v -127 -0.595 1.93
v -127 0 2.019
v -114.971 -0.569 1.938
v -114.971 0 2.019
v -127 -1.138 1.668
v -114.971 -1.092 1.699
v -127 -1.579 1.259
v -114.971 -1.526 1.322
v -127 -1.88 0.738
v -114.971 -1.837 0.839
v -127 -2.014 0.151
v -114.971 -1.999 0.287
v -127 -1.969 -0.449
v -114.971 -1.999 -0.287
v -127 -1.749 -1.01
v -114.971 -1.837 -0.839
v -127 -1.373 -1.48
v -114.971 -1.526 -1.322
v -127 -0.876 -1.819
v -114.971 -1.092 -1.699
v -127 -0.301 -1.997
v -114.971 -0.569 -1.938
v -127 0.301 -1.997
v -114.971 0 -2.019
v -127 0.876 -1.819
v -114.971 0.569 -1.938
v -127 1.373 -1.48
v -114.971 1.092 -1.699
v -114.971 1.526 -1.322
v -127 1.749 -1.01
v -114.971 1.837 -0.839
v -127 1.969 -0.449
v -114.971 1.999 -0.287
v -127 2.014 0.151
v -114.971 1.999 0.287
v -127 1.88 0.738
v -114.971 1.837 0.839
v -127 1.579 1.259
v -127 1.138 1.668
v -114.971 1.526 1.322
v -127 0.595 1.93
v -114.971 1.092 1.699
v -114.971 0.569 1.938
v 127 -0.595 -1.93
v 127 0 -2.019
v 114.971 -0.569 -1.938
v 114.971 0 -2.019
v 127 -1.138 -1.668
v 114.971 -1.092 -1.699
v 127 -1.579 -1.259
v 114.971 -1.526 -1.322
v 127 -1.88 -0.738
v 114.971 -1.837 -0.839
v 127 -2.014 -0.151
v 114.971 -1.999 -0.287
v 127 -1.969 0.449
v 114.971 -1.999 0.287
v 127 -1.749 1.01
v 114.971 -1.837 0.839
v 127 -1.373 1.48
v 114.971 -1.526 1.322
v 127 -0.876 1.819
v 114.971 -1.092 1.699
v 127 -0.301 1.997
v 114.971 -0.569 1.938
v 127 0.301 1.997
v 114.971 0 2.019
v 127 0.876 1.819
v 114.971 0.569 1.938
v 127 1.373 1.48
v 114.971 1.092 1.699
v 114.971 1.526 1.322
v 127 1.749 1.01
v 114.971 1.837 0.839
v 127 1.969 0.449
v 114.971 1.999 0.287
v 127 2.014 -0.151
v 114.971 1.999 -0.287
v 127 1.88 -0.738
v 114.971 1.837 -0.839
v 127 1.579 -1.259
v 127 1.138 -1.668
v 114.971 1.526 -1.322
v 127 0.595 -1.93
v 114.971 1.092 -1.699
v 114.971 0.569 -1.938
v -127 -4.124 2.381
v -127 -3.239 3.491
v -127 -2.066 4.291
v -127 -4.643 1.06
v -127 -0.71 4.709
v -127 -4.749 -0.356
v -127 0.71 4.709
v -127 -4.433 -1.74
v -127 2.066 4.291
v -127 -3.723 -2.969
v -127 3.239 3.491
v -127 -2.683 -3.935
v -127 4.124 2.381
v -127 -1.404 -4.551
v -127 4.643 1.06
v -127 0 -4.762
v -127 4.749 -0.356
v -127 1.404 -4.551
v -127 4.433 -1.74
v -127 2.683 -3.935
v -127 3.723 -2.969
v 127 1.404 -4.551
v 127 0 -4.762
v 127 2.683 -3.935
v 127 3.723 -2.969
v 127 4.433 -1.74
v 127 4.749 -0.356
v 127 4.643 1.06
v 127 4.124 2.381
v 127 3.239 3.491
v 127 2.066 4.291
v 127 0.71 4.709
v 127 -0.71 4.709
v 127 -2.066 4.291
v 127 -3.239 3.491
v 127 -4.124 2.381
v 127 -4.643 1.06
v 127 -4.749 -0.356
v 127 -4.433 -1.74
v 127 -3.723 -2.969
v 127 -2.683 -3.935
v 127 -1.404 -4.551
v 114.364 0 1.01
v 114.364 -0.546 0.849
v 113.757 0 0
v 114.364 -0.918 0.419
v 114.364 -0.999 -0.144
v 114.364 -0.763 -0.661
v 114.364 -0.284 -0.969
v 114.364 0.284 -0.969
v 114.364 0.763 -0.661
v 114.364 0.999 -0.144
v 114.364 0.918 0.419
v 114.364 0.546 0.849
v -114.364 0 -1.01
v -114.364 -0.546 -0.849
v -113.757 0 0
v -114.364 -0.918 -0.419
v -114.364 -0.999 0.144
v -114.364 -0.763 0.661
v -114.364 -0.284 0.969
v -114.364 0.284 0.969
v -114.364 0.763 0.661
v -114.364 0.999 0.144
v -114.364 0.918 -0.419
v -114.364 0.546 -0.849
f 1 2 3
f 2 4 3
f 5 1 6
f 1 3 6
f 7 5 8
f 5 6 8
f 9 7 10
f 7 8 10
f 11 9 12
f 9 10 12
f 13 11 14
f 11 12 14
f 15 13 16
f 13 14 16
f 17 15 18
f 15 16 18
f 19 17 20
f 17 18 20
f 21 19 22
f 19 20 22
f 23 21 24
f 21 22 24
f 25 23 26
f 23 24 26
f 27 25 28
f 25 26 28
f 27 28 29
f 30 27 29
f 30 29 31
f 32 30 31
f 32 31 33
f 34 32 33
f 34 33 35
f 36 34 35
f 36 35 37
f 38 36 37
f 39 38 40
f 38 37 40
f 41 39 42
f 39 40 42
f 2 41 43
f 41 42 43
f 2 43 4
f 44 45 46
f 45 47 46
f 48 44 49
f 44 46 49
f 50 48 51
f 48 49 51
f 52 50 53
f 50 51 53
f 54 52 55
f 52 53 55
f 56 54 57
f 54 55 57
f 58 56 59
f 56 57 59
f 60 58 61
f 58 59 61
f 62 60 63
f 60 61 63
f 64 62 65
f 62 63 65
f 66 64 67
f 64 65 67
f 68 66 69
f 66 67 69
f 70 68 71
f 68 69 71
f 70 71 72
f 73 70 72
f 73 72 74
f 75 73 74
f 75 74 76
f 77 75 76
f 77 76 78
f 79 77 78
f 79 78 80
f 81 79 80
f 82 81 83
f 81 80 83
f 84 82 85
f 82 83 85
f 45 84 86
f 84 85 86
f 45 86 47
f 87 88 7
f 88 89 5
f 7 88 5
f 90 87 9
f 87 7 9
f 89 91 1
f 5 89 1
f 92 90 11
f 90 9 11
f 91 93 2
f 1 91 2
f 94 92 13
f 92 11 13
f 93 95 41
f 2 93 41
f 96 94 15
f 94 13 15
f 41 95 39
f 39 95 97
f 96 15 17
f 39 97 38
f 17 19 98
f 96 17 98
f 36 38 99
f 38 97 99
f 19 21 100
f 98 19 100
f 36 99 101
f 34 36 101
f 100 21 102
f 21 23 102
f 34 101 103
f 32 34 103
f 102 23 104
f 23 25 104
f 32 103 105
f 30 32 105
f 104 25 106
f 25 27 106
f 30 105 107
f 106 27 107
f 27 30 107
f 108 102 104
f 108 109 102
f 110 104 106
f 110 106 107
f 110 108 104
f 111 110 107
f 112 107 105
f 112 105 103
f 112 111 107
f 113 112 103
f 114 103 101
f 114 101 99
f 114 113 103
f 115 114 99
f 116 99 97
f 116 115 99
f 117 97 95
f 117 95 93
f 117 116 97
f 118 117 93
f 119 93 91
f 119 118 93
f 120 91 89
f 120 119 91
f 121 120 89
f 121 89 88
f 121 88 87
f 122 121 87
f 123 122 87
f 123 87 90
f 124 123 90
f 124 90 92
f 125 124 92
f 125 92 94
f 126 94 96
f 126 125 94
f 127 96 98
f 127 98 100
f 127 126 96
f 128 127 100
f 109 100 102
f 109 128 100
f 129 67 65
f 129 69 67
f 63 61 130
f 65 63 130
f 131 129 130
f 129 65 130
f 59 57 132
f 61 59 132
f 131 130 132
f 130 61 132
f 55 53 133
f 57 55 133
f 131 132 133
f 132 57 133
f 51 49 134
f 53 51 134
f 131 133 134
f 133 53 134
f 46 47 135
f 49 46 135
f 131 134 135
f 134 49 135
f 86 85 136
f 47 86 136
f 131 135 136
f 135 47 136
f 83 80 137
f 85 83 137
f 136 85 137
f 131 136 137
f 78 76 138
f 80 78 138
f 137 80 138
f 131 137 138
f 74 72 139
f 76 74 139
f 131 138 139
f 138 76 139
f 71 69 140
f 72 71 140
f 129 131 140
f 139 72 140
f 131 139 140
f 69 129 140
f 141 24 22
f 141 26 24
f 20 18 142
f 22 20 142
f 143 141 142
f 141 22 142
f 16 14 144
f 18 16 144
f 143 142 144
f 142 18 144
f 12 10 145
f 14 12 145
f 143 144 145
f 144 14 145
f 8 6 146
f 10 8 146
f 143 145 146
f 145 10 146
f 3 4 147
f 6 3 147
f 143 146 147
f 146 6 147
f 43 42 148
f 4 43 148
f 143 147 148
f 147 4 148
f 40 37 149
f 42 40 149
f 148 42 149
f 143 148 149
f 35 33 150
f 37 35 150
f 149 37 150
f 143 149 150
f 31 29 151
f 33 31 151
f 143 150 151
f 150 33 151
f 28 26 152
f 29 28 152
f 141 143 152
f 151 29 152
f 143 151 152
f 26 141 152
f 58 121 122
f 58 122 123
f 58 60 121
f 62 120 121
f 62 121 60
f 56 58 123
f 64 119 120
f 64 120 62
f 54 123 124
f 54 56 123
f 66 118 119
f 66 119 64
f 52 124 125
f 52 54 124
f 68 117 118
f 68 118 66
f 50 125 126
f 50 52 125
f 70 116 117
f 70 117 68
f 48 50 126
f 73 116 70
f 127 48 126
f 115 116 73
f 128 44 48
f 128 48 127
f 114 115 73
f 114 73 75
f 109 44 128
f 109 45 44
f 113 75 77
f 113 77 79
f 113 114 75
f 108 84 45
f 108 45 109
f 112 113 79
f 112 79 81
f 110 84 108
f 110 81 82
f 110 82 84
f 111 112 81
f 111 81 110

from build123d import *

# Parameters (mm, degrees)
SKETCH1_R                            = 4.7625
BOSS_EXTRUDE1_DEPTH                  = 127
F_10_32_TAPPED_HOLE1_D               = 4.0386
F_10_32_TAPPED_HOLE1_DEPTH           = 12.02944
F_10_32_TAPPED_HOLE1_TIP             = 1.213317848
F_10_32_TAPPED_HOLE1_ON_FACE_2_D     = 4.0386
F_10_32_TAPPED_HOLE1_ON_FACE_2_DEPTH = 12.02944
F_10_32_TAPPED_HOLE1_ON_FACE_2_TIP   = 1.213317848


with BuildPart() as part:
    # Sketch1 → Boss-Extrude1 (new, symmetric)
    with BuildSketch(Plane(origin=(0, 0, 0), x_dir=(0, 0, -1), z_dir=(1, 0, 0))):
        Circle(SKETCH1_R)
    extrude(amount=BOSS_EXTRUDE1_DEPTH, both=True)

    # #10-32 Tapped Hole1
    with Locations(Plane(origin=(127, 0, 0), x_dir=(0, 0, 1), z_dir=(1, 0, 0))):
        with Locations((0, 0)):
            Hole(F_10_32_TAPPED_HOLE1_D / 2, depth=F_10_32_TAPPED_HOLE1_DEPTH)
            with Locations((0, 0, -(F_10_32_TAPPED_HOLE1_DEPTH + F_10_32_TAPPED_HOLE1_TIP / 2))):  # 118° drill point
                Cone(0, F_10_32_TAPPED_HOLE1_D / 2, F_10_32_TAPPED_HOLE1_TIP, mode=Mode.SUBTRACT)

    # #10-32 Tapped Hole1 on face 2
    with Locations(Plane(origin=(-127, 0, 0), x_dir=(0, 0, -1), z_dir=(-1, 0, 0))):
        with Locations((0, 0)):
            Hole(F_10_32_TAPPED_HOLE1_ON_FACE_2_D / 2, depth=F_10_32_TAPPED_HOLE1_ON_FACE_2_DEPTH)
            with Locations((0, 0, -(F_10_32_TAPPED_HOLE1_ON_FACE_2_DEPTH + F_10_32_TAPPED_HOLE1_ON_FACE_2_TIP / 2))):  # 118° drill point
                Cone(0, F_10_32_TAPPED_HOLE1_ON_FACE_2_D / 2, F_10_32_TAPPED_HOLE1_ON_FACE_2_TIP, mode=Mode.SUBTRACT)


solid = part.part
